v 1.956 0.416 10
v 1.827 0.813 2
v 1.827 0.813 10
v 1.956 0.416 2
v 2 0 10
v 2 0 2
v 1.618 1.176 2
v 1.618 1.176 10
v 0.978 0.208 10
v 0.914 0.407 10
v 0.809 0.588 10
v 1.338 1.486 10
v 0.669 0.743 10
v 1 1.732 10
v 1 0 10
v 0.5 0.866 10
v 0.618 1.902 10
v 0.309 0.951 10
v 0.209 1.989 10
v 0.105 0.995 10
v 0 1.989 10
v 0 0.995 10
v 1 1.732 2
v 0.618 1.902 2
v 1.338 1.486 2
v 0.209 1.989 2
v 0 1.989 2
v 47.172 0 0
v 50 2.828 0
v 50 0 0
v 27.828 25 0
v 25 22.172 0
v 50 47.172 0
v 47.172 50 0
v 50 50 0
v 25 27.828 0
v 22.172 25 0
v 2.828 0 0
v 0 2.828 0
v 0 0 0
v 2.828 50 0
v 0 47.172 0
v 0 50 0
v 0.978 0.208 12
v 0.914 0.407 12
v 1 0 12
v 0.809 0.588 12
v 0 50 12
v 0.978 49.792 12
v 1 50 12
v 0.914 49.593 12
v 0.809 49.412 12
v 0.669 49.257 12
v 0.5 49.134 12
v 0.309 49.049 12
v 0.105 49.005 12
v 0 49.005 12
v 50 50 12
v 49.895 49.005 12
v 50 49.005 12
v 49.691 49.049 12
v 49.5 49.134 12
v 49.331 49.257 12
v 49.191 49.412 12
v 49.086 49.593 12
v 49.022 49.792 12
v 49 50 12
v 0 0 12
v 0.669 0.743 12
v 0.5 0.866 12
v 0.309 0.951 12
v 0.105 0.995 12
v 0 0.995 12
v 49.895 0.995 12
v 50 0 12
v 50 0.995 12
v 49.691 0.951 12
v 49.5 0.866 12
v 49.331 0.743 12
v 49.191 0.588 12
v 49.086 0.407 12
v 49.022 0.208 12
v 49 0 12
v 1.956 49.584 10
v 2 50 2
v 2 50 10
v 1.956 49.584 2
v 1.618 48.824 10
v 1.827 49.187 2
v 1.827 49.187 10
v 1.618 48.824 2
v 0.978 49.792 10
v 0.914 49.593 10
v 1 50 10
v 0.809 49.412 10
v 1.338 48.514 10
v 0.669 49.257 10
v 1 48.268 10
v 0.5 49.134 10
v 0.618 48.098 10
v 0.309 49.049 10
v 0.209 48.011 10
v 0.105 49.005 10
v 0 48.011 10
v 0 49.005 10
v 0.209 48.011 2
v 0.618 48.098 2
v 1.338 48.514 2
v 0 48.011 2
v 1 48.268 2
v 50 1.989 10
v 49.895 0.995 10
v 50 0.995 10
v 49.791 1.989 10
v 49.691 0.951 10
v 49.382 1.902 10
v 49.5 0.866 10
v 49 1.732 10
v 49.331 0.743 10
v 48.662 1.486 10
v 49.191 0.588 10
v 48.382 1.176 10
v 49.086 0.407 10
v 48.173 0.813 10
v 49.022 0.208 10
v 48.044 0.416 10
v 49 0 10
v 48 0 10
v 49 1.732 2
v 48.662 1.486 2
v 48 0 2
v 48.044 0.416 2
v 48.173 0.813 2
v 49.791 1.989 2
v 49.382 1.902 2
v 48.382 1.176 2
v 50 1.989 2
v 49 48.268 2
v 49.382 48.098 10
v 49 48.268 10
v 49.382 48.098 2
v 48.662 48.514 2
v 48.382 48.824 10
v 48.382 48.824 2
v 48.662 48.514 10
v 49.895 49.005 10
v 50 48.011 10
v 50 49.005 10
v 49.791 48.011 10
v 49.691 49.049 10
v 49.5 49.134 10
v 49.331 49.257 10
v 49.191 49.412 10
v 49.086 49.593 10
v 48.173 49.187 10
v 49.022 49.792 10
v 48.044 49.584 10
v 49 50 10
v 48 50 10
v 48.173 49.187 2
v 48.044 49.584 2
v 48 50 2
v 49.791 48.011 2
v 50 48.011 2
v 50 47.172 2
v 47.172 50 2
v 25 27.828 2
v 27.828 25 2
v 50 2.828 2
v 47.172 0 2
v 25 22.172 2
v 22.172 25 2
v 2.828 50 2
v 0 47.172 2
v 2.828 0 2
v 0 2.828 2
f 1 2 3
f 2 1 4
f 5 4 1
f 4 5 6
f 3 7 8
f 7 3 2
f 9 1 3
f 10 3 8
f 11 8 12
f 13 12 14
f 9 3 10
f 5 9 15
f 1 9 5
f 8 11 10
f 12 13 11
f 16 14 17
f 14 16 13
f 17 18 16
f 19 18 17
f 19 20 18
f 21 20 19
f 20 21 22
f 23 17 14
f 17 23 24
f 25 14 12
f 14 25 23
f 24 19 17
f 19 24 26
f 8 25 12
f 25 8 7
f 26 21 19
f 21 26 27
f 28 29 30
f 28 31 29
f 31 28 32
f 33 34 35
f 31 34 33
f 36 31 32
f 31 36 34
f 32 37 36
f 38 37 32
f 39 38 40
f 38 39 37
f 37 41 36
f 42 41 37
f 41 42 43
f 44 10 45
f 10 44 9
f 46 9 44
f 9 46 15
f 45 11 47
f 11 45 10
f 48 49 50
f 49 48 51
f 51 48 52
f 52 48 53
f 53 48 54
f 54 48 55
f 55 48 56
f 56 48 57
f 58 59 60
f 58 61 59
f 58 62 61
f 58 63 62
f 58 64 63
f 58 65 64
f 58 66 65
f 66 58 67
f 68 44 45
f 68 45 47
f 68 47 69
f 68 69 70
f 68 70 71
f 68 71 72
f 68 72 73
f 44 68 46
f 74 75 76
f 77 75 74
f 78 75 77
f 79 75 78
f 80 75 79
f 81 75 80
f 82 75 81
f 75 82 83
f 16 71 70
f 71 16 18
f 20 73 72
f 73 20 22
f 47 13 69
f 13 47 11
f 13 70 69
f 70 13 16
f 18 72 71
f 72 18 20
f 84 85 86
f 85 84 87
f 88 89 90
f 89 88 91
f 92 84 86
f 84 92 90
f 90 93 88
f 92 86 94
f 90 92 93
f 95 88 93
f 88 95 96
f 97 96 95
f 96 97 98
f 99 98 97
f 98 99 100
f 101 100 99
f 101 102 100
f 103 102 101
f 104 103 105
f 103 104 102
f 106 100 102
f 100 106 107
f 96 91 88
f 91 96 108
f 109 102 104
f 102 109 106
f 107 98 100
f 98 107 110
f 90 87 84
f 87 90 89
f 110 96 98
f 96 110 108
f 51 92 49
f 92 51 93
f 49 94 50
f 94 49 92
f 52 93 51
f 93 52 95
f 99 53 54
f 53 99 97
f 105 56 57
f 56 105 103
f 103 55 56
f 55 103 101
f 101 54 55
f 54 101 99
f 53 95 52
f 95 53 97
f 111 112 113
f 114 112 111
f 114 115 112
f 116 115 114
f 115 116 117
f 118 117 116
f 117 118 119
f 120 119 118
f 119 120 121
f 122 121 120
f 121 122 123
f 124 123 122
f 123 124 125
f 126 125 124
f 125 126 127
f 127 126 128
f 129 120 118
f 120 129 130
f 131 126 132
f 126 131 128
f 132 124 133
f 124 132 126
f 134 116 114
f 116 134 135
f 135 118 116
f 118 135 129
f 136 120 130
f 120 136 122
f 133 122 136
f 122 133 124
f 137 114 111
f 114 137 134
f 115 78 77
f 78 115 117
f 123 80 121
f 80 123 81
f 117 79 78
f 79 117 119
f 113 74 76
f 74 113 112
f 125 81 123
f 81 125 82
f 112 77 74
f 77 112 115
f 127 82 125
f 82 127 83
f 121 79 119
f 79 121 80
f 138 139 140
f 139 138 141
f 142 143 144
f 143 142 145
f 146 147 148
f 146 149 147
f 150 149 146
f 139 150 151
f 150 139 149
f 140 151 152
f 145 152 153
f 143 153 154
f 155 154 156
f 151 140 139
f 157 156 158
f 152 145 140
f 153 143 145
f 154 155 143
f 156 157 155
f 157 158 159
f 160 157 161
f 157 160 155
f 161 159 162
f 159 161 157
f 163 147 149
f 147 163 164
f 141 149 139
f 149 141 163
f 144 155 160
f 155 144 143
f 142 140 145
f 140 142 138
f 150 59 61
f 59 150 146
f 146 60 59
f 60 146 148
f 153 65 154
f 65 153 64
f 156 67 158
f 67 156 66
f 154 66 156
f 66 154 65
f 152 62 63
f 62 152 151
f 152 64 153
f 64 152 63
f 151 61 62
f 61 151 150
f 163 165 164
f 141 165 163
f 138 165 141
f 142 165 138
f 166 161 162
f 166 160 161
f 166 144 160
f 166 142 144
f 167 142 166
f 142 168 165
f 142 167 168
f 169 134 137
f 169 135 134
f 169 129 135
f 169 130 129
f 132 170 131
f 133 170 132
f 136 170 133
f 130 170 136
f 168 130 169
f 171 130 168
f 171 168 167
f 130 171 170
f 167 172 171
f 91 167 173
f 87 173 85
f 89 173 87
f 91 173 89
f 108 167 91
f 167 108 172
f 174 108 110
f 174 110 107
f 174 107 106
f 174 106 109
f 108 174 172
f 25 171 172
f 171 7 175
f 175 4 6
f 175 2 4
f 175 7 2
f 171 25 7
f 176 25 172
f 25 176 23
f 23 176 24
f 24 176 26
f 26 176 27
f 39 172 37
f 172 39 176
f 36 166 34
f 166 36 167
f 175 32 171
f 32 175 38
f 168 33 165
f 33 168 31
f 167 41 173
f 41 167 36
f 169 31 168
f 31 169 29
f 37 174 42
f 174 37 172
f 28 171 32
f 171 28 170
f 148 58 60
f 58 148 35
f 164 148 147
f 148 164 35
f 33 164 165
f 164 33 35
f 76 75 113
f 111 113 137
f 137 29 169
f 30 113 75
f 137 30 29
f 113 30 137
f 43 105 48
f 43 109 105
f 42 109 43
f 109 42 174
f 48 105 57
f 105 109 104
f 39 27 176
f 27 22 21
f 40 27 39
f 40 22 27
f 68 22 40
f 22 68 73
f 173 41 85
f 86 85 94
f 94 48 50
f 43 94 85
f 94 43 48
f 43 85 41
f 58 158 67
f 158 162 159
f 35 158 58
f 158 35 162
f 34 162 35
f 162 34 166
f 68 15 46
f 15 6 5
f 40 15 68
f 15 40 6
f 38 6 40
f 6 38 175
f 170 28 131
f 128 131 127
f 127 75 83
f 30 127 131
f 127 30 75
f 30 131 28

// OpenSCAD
// file: common.scad
$fs = 0.1;

mm = 1;

intra_board_width = 50 * mm;
inter_board_width = 50 * mm;

link_width = 4 * mm;
link_height = 2 * mm;

standoff_width = 4 * mm;
standoff_height = 10 * mm;

peg_width = 2 * mm;
peg_height = 2 * mm;

total_height = standoff_height + peg_height;

module peg()
{
    cylinder(h = standoff_height, d = standoff_width);
    translate([ 0, 0, standoff_height ]) cylinder(h = peg_height, d = peg_width);
}

module link(length)
{
    translate([ 0, -0.5 * link_width, 0 ]) cube([ length, link_width, link_height ]);
}
// main file
include <common.scad>

module x_link_uncut()
{
    for (i = [ 0, 1 ])
        for (j = [ 0, 1 ])
            translate([ i * intra_board_width, j * inter_board_width ]) peg();

    rotate([ 0, 0, atan(inter_board_width / intra_board_width) ])
        link(sqrt(pow(intra_board_width, 2) + pow(inter_board_width, 2)));

    translate([ 0, inter_board_width, 0 ]) rotate([ 0, 0, -atan(inter_board_width / intra_board_width) ])
        link(sqrt(pow(intra_board_width, 2) + pow(inter_board_width, 2)));
}

module x_link()
{
    intersection()
    {
        cube([ intra_board_width, inter_board_width, total_height ]);
        x_link_uncut();
    }
}

x_link();
